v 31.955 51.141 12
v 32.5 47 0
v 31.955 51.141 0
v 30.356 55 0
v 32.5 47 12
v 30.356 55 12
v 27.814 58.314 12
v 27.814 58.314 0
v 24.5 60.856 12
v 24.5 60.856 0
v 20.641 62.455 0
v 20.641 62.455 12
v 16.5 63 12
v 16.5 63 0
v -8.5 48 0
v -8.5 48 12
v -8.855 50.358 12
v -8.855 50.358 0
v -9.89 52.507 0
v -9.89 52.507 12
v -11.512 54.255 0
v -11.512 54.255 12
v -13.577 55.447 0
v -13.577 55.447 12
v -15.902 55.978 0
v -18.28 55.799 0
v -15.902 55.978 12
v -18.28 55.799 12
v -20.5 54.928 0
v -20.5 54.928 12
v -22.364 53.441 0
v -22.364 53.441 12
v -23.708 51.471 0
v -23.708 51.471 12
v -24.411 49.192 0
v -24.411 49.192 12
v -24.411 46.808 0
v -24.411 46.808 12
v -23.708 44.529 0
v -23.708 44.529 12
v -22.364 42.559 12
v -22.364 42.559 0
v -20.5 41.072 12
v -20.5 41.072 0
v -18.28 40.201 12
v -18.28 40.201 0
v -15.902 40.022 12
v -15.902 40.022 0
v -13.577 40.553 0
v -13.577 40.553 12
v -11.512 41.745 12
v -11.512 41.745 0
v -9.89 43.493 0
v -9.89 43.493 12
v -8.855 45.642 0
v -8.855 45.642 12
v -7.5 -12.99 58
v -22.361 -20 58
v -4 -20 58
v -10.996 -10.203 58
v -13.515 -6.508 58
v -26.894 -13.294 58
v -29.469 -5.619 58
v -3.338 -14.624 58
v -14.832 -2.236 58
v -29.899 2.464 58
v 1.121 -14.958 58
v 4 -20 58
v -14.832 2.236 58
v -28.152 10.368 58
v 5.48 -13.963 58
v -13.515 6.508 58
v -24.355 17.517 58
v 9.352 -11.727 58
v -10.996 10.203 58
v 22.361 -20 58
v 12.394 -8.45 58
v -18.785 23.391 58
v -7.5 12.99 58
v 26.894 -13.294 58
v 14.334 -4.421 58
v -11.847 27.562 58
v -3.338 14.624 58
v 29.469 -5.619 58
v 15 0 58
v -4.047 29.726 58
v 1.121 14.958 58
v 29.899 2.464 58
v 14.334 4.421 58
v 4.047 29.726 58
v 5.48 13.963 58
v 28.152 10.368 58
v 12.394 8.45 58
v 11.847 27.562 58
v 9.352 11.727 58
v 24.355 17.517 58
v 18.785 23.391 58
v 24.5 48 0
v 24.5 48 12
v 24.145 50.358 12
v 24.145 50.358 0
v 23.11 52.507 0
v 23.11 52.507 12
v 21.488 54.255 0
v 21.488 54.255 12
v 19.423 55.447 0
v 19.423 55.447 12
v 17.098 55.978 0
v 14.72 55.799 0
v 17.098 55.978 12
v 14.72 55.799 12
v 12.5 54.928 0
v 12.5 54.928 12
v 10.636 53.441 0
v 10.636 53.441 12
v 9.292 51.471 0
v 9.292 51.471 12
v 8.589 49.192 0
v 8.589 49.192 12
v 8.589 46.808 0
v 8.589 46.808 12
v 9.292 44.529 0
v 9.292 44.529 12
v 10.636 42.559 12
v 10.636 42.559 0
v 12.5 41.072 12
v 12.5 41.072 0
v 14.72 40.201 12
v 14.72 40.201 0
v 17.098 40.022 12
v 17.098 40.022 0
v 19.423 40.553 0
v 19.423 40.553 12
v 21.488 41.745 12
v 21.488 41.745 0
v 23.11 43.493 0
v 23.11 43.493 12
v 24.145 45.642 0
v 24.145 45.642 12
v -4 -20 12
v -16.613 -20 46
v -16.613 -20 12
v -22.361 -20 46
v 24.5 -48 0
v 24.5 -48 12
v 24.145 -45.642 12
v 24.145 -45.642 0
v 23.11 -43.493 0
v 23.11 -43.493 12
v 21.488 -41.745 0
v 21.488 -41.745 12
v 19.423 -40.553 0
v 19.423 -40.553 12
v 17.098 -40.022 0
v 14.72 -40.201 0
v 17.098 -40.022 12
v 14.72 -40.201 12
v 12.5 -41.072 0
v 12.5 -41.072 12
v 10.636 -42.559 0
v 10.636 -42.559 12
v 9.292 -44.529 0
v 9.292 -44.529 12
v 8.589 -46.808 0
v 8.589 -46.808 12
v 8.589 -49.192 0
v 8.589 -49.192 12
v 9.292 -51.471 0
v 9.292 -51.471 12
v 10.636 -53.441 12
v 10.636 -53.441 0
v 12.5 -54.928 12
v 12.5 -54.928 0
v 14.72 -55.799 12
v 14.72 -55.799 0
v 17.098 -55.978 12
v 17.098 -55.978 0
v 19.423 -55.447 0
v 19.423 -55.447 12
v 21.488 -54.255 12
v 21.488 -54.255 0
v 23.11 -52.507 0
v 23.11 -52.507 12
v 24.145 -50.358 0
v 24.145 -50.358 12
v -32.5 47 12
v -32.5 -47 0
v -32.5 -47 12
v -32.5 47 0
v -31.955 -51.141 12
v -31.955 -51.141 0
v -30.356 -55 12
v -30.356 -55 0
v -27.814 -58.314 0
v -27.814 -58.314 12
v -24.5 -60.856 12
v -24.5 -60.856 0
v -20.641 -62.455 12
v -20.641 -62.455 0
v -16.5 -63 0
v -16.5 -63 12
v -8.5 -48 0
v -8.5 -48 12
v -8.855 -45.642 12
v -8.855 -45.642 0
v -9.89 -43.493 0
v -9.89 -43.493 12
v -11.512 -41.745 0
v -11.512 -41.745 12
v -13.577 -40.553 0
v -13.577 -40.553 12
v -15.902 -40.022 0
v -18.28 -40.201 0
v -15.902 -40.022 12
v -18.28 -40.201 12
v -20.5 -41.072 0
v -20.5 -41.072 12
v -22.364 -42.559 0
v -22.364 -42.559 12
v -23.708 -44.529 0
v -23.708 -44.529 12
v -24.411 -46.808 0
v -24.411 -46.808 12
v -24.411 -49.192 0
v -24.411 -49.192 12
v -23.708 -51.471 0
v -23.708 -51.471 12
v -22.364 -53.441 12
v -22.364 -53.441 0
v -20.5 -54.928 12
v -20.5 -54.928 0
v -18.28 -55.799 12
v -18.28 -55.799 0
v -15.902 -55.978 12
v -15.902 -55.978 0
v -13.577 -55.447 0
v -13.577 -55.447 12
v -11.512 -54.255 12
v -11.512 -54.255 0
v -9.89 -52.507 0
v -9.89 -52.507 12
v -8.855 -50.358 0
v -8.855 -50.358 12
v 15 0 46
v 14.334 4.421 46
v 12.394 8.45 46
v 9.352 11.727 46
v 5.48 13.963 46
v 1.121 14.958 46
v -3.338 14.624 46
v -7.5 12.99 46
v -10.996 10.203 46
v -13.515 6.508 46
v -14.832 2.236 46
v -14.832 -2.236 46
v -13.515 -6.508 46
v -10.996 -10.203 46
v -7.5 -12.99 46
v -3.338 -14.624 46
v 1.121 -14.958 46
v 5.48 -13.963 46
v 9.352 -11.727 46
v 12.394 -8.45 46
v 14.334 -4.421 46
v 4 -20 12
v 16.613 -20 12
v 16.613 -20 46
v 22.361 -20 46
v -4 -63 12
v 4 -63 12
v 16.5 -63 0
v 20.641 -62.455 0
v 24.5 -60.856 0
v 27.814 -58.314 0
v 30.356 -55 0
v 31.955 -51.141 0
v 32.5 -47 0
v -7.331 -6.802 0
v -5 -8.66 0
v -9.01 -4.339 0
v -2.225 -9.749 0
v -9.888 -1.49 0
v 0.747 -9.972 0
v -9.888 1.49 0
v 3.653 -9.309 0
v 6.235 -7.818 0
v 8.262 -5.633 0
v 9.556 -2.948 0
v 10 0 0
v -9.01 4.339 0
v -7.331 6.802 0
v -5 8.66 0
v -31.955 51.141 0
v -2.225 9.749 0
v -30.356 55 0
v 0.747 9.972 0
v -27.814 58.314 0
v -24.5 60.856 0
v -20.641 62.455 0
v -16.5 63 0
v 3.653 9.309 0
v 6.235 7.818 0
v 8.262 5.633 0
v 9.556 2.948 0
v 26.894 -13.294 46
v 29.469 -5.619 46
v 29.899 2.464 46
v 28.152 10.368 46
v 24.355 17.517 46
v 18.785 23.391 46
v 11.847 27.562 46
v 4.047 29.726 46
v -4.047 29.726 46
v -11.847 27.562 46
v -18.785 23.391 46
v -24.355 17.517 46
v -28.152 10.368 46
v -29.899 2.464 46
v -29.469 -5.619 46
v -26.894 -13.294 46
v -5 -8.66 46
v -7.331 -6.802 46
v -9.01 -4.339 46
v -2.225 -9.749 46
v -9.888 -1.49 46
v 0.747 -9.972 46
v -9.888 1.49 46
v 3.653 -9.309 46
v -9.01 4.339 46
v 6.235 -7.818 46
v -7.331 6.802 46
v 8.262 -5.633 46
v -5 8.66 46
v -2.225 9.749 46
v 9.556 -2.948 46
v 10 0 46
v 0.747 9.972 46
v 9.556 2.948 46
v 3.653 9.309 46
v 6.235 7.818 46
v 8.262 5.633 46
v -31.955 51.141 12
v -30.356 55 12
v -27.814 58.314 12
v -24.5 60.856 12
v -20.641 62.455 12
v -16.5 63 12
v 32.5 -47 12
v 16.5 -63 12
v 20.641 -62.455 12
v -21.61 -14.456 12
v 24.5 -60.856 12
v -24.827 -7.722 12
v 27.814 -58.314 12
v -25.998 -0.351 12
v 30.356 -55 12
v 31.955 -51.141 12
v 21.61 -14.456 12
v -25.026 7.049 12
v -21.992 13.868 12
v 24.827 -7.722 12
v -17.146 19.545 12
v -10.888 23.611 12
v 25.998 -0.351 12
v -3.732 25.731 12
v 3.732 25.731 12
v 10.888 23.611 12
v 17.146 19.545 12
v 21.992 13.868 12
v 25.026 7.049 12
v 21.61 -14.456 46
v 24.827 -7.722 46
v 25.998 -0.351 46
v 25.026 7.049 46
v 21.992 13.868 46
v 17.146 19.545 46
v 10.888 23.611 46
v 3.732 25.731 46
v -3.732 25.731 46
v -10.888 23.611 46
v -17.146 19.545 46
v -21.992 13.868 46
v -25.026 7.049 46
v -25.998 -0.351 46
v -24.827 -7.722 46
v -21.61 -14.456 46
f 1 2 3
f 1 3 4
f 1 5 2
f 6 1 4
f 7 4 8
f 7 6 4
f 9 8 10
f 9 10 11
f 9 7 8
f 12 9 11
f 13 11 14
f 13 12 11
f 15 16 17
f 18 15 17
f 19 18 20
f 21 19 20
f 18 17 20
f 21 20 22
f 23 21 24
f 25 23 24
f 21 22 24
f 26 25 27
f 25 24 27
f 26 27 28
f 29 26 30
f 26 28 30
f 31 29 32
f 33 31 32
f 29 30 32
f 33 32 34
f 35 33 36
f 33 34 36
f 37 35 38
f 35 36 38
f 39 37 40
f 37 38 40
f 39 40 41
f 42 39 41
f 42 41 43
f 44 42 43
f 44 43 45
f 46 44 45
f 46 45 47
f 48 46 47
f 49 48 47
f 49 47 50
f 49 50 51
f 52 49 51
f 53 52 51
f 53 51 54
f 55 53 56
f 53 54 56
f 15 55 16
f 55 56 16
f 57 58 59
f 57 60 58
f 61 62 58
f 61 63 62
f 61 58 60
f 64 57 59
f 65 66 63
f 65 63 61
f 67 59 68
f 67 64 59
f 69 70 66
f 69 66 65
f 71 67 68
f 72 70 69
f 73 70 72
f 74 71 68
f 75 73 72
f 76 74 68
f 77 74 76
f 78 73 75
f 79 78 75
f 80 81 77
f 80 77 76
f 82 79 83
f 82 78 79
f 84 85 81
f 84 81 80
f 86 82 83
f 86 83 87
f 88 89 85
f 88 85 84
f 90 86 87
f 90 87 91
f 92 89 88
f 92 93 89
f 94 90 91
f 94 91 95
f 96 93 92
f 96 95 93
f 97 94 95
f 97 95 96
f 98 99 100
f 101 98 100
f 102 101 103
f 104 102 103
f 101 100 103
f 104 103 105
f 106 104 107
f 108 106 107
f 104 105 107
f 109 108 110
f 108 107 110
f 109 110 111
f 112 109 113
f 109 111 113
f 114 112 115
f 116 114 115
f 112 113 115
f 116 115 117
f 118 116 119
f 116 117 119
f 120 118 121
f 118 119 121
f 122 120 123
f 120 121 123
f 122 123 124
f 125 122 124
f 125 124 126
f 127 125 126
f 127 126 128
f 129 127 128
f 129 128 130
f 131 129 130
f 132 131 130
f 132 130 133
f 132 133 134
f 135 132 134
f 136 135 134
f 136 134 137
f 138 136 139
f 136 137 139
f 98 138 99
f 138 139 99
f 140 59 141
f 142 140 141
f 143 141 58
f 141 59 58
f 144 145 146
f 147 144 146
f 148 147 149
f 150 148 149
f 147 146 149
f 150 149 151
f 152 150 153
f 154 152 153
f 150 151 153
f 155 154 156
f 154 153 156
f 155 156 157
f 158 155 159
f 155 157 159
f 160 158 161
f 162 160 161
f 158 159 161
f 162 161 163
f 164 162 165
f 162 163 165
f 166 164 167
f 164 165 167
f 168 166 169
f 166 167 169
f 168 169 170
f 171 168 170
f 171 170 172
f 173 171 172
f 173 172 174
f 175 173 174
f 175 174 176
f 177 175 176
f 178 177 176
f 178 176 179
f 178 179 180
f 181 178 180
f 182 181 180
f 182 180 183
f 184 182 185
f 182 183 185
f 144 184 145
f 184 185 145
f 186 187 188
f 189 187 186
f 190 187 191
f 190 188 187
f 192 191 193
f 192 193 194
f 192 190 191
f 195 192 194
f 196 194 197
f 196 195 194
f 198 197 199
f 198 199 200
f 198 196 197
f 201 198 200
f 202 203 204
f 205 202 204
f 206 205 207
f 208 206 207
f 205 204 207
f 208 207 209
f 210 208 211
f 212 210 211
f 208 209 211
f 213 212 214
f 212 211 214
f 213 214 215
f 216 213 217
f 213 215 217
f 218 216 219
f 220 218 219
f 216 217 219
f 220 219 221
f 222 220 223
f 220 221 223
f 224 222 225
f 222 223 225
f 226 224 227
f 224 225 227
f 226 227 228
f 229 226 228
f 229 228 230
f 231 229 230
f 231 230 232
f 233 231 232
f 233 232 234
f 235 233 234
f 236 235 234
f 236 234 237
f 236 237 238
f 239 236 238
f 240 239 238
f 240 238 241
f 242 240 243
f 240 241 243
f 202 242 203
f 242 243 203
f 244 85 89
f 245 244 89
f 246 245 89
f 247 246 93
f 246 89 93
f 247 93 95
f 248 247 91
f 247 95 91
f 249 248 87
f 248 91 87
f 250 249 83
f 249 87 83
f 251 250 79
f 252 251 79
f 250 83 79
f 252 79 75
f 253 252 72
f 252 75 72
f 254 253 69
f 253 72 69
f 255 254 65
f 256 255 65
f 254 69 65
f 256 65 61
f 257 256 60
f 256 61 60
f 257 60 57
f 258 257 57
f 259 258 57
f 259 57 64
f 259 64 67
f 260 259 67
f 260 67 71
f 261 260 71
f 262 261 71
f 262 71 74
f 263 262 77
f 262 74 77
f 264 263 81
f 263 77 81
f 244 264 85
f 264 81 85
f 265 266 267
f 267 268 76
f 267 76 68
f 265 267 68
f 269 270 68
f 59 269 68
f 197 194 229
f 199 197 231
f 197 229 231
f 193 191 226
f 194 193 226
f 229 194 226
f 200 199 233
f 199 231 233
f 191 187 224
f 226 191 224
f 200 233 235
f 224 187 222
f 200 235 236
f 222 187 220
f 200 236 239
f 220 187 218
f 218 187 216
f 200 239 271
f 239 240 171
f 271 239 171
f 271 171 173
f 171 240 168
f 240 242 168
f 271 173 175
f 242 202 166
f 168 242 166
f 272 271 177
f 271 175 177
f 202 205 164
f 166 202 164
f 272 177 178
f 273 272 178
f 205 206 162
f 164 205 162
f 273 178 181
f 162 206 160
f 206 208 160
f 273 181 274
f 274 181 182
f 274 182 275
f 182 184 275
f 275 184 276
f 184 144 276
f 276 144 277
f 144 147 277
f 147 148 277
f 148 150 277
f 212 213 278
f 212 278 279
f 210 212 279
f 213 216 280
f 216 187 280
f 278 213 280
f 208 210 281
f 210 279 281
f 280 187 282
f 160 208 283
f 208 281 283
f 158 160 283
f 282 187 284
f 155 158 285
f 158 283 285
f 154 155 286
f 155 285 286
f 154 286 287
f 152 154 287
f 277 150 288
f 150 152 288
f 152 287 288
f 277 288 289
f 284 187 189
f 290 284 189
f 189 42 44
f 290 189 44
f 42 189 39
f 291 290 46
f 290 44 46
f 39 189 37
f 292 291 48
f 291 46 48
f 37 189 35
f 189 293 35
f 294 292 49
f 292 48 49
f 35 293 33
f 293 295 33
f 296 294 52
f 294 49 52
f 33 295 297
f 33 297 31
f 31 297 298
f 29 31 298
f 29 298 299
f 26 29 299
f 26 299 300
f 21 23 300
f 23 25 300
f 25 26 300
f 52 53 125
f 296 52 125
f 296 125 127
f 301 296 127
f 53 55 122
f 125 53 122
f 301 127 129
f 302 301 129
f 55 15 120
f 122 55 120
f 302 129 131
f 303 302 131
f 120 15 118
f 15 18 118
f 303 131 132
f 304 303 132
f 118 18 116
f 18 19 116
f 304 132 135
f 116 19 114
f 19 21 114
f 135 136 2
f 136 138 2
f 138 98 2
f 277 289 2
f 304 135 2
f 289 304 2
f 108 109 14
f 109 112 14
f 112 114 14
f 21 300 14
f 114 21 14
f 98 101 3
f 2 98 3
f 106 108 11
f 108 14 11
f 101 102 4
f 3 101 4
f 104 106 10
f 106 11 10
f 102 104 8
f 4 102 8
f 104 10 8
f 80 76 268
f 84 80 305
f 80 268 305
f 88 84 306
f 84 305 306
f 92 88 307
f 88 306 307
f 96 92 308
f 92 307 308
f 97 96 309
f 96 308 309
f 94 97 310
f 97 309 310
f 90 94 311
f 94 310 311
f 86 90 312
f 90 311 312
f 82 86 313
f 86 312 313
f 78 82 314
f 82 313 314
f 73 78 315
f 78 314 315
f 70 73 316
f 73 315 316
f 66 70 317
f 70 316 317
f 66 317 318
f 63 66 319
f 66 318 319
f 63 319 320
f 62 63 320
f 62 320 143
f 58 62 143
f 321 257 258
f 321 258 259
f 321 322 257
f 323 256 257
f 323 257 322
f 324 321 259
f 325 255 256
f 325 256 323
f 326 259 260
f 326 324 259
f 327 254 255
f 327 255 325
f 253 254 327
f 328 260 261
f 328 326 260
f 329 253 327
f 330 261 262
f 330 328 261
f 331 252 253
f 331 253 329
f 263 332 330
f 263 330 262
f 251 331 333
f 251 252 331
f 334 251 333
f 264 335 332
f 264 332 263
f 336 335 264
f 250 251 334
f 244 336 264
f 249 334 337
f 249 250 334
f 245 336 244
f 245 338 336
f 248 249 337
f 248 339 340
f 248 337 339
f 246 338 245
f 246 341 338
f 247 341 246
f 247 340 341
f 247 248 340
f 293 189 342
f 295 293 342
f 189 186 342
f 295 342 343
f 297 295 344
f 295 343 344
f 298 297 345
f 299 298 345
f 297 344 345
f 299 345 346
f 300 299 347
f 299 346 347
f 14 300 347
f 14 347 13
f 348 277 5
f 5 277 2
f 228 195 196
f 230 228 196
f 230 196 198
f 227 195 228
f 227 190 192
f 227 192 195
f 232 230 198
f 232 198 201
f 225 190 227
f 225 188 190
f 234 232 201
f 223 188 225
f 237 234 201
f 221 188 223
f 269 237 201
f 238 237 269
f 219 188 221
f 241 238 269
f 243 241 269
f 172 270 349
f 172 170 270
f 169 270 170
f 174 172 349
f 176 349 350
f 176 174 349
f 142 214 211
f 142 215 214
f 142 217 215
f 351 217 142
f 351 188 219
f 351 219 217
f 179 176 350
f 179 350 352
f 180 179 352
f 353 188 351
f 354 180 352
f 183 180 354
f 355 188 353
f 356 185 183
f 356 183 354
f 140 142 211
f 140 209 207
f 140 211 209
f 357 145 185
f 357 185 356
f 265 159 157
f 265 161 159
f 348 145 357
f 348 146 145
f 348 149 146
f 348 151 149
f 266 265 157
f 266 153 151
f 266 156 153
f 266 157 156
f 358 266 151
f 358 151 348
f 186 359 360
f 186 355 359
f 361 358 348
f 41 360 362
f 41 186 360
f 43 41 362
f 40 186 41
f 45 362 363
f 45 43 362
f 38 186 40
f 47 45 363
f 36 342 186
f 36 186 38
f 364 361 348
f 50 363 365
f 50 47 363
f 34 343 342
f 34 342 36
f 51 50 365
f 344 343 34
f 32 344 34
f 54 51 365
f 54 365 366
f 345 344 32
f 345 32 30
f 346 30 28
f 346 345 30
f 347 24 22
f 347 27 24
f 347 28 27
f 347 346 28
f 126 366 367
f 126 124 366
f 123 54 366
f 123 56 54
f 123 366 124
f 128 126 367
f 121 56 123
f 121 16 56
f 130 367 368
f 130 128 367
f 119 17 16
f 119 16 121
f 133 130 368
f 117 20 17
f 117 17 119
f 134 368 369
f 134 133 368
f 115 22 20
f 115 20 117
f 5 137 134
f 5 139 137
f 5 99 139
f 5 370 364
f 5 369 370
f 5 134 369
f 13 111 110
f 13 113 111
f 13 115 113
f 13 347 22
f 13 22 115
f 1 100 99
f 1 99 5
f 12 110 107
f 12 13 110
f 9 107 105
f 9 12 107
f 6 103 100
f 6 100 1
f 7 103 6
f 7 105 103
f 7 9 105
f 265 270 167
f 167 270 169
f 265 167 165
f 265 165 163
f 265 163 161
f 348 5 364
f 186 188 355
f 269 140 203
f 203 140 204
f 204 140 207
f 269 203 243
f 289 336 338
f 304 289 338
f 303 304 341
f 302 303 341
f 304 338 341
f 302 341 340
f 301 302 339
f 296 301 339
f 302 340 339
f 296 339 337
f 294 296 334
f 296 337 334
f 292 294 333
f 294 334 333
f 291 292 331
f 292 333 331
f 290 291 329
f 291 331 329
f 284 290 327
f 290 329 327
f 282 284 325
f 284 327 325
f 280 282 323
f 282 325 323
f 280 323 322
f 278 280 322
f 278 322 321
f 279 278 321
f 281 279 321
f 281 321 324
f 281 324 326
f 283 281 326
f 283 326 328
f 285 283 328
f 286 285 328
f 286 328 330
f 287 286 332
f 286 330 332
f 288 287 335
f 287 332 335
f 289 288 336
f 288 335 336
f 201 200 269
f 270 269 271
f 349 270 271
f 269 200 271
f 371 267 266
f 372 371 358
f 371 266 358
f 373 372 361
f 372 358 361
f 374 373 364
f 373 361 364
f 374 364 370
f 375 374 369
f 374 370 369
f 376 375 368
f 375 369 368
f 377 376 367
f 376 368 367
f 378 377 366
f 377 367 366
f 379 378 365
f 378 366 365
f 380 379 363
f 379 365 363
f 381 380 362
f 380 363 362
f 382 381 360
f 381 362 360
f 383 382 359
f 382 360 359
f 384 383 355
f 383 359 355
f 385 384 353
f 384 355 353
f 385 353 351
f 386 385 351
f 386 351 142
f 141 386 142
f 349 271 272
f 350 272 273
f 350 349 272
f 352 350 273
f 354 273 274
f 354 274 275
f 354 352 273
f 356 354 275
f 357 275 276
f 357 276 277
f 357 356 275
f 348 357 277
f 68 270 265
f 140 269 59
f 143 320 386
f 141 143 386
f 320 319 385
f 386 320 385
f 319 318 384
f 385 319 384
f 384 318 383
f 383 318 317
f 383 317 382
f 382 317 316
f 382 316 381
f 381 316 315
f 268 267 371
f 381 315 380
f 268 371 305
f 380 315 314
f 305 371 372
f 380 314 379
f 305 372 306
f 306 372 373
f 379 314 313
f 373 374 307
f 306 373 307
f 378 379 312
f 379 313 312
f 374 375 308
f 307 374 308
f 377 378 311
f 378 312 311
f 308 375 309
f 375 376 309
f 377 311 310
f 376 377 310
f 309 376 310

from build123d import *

# Parameters (mm, degrees)
F0_W      = 65
F0_H      = 126
F1_DEPTH  = 12
F2_R      = 16
F3_R      = 8
F4_DEPTH  = 12
F5_R      = 26
F6_DEPTH  = 34
F7_R      = 30
F8_DEPTH  = 12
F9_R      = 15
F10_DEPTH = 12
F11_R     = 10
F12_DEPTH = 46
F14_DEPTH = 46
F15_W     = 8
F15_H     = 43
F16_DEPTH = 46
F18_DEPTH = 8


with BuildPart() as f1:
    # F0 (on Top) → F1 (new body)
    with BuildSketch(Plane.XY):
        Rectangle(F0_W, F0_H)
    extrude(amount=F1_DEPTH)

    # F2
    f2_edges = [f1.edges().sort_by_distance(p)[0] for p in [
        (32.5, -63, 6),
        (-32.5, -63, 6),
        (32.5, 63, 6),
        (-32.5, 63, 6),
    ]]
    fillet(f2_edges, radius=F2_R)

    # F3 (on face) → F4 (cut, through all)
    with BuildSketch(Plane.XY.offset(12)):
        with Locations((-16.5, 48)):
            Circle(F3_R)
        with Locations((16.5, 48)):
            Circle(F3_R)
        with Locations((16.5, -48)):
            Circle(F3_R)
        with Locations((-16.5, -48)):
            Circle(F3_R)
    extrude(amount=-F4_DEPTH, mode=Mode.SUBTRACT)

    # F5 (on face) → F6 (join)
    with BuildSketch(Plane.XY.offset(12)):
        Circle(F5_R)
    extrude(amount=F6_DEPTH)

    # F7 (on face) → F8 (join)
    with BuildSketch(Plane.XY.offset(46)):
        Circle(F7_R)
    extrude(amount=F8_DEPTH)

    # F9 (on face) → F10 (cut)
    with BuildSketch(Plane.XY.offset(58)):
        Circle(F9_R)
    extrude(amount=-F10_DEPTH, mode=Mode.SUBTRACT)

    # F11 (on face) → F12 (cut, through all)
    with BuildSketch(Plane.XY.offset(46)):
        Circle(F11_R)
    extrude(amount=-F12_DEPTH, mode=Mode.SUBTRACT)

    # F13 (on face) → F14 (cut, through all)
    with BuildSketch(Plane.XY.offset(58)):
        with BuildLine():
            Line((22.36068, -20), (-22.36068, -20))
            ThreePointArc((-22.36068, -20), (0, -30), (22.36068, -20))
        make_face()
    extrude(amount=-F14_DEPTH, mode=Mode.SUBTRACT)

    # F15 (on face) → F16 (join, through all)
    with BuildSketch(Plane.XY.offset(12)):
        with Locations((0, -41.5)):
            Rectangle(F15_W, F15_H)
    extrude(amount=F16_DEPTH)

    # F17 (on face) → F18 (cut, through all)
    with BuildSketch(Plane.YZ.offset(4)):
        Polygon((-63, 12), (-20, 58), (-63, 58), align=None)
    extrude(amount=-F18_DEPTH, mode=Mode.SUBTRACT)


solid = f1.part
